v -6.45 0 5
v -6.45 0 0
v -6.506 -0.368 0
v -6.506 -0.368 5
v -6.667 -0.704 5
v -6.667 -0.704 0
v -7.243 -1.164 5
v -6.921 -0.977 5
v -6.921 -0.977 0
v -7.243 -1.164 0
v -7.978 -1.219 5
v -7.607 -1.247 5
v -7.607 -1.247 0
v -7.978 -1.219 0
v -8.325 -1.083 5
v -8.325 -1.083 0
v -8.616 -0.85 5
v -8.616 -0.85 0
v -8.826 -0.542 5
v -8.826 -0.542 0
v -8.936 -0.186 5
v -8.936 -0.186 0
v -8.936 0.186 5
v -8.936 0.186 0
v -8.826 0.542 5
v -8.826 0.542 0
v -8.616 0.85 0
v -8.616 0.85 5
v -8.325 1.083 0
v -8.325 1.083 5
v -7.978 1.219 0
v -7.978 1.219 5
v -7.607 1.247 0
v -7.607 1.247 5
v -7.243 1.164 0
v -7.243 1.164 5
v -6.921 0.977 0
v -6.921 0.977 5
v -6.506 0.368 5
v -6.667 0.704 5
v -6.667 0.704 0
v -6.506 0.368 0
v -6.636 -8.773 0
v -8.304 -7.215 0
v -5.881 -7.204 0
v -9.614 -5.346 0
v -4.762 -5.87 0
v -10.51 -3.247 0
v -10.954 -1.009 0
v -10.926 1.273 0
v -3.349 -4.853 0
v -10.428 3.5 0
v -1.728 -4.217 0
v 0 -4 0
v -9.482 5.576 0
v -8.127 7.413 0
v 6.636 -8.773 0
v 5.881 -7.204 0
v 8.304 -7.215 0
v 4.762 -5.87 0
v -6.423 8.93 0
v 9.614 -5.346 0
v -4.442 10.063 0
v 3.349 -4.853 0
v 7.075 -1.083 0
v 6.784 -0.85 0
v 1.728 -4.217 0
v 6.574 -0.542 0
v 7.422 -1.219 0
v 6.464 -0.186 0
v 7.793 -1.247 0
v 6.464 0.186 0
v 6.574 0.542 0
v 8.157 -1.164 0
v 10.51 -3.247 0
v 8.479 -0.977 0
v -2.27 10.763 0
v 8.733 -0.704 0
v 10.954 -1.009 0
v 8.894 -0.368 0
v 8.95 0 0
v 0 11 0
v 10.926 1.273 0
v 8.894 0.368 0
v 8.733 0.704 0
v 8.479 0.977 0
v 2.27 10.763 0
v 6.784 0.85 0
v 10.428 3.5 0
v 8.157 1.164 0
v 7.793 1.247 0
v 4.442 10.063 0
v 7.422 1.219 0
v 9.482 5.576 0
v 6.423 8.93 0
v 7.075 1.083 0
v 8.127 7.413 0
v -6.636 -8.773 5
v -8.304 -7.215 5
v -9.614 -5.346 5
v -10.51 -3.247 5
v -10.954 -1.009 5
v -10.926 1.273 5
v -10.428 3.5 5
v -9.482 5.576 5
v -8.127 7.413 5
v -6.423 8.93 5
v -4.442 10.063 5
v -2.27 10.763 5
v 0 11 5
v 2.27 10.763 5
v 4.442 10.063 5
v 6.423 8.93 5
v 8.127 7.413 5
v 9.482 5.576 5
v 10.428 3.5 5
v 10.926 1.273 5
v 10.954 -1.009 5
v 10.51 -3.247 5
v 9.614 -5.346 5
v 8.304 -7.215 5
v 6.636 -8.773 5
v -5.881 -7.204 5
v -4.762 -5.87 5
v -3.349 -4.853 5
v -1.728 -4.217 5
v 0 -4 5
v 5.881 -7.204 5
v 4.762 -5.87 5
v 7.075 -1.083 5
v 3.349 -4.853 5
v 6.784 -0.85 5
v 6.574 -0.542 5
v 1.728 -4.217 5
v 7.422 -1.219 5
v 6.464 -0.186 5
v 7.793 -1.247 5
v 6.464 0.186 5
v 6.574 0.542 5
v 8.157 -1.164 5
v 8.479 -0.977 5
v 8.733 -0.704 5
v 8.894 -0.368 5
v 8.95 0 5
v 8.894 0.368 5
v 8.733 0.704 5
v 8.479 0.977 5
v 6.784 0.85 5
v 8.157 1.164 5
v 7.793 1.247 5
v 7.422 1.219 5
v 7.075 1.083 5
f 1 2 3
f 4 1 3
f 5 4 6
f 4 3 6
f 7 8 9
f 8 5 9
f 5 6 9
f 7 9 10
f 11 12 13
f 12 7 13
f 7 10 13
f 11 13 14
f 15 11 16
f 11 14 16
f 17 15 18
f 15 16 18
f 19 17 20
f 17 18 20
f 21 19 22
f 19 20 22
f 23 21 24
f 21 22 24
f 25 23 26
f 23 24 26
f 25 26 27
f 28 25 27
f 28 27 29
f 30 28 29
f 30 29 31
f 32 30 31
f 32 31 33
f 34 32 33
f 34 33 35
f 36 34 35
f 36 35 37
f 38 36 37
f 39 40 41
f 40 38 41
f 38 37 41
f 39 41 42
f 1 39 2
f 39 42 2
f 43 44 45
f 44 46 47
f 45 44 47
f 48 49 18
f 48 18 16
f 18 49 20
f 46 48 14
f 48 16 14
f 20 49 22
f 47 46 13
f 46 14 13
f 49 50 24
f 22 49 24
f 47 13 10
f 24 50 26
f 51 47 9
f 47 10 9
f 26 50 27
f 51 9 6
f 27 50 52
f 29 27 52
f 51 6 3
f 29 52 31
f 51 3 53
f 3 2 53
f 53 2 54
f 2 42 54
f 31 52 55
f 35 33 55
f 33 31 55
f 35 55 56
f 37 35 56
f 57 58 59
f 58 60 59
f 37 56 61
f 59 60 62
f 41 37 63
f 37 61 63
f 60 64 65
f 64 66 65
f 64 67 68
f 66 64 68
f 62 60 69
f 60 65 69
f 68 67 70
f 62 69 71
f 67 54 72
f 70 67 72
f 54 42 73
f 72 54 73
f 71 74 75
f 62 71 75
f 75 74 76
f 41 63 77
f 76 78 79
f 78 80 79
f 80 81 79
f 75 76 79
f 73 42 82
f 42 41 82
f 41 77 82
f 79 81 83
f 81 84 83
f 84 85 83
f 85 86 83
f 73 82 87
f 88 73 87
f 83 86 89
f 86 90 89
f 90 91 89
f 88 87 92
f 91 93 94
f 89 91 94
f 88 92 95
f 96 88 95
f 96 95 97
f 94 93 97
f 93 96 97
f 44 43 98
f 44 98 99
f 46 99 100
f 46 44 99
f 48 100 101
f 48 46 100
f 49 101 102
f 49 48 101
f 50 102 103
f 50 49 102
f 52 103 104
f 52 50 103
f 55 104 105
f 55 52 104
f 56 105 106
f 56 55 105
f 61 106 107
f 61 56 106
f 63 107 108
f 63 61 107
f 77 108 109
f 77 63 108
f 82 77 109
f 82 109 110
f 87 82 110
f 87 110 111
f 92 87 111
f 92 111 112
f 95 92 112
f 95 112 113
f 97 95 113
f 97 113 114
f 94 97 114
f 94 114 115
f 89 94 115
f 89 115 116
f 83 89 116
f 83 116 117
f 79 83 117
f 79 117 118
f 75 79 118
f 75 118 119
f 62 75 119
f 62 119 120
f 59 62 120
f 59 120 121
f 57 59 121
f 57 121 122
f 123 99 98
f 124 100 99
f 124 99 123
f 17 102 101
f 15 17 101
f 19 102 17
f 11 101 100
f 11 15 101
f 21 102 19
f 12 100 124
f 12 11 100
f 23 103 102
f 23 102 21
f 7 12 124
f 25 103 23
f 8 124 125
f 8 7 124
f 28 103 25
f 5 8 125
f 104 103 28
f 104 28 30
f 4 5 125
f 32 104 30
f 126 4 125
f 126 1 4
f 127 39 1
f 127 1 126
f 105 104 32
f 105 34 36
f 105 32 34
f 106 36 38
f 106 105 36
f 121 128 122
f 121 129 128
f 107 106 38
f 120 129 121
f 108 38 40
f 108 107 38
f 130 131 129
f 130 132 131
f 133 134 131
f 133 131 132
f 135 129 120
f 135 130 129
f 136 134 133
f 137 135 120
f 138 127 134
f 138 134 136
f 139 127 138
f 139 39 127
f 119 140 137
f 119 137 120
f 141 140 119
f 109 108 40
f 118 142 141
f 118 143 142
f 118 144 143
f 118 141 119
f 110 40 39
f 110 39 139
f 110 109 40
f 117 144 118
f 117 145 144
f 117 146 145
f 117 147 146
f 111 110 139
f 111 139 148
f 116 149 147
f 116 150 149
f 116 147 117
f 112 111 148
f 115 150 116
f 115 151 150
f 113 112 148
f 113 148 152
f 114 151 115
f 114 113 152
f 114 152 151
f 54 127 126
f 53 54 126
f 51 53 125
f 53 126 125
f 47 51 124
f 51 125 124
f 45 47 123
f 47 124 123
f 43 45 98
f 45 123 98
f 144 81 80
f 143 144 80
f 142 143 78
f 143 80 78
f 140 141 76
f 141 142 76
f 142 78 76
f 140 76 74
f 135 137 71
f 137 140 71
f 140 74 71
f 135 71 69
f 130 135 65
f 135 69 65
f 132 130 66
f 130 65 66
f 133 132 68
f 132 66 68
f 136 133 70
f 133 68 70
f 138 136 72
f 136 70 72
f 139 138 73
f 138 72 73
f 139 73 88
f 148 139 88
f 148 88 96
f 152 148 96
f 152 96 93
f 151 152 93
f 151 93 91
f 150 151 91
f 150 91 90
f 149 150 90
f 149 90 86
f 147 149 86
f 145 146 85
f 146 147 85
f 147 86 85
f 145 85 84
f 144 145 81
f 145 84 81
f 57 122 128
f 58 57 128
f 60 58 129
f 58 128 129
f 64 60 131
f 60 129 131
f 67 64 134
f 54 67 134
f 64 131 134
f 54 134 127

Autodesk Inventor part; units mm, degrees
ref_plane "YZ Plane" through (0, 0, 0) normal (1, 0, 0) x (0, 1, 0)
ref_plane "XZ Plane" through (0, 0, 0) normal (0, 1, 0) x (-1, 0, 0)
ref_plane "XY Plane" through (0, 0, 0) normal (0, 0, 1) x (1, 0, 0)
sketch "Sketch1" plane through (0, 0, 0) normal (0, 0, 1) x (1, 0, 0)
  circle A0 centre (0, 0) radius 11
  line L0 (-7.7, 0) -> (7.7, 0) construction
  circle A1 centre (-7.7, 0) radius 1.25
  circle A2 centre (7.7, 0) radius 1.25
  dimension "d0" = 22
  dimension "d1" = 15.4
  dimension "d2" = 2.5
  dimension "d3" = 2.5
extrude "Extrusion1" add sketch "Sketch1" along normal blind 5
sketch "Sketch2" plane through (0, 0, 5) normal (0, 0, 1) x (1, 0, 0)
  circle A0 centre (0, 0) radius 11 projected
  arc A1 (6.6742, -8.8894) -> (0, -4) centre (0, -11) ccw
  arc A2 (0, -4) -> (-6.6362, -8.7727) centre (0, -11) ccw
  point P0 (6.6362, -8.7727)
extrude "Extrusion2" cut sketch "Sketch2" against normal blind 10 contours A2 A1 A0 picked at (-1.3613, -8.6538)
equation "\"d0\" = cs_diam"
equation "\"d1\" = cs_holeSpacing"
equation "\"d2\" = cs_holeDiam"
equation "\"d3\" = cs_holeDiam"
equation "\"d4\" = cs_depth"
equation "\"cs_diam\" = 22"
equation "\"cs_holeSpacing\" = 15.4"
equation "\"cs_holeDiam\" = 2.5"
equation "\"cs_depth\" = 5"
properties part number "Caster Spacer 5mm" material "PMMA Plastic"
